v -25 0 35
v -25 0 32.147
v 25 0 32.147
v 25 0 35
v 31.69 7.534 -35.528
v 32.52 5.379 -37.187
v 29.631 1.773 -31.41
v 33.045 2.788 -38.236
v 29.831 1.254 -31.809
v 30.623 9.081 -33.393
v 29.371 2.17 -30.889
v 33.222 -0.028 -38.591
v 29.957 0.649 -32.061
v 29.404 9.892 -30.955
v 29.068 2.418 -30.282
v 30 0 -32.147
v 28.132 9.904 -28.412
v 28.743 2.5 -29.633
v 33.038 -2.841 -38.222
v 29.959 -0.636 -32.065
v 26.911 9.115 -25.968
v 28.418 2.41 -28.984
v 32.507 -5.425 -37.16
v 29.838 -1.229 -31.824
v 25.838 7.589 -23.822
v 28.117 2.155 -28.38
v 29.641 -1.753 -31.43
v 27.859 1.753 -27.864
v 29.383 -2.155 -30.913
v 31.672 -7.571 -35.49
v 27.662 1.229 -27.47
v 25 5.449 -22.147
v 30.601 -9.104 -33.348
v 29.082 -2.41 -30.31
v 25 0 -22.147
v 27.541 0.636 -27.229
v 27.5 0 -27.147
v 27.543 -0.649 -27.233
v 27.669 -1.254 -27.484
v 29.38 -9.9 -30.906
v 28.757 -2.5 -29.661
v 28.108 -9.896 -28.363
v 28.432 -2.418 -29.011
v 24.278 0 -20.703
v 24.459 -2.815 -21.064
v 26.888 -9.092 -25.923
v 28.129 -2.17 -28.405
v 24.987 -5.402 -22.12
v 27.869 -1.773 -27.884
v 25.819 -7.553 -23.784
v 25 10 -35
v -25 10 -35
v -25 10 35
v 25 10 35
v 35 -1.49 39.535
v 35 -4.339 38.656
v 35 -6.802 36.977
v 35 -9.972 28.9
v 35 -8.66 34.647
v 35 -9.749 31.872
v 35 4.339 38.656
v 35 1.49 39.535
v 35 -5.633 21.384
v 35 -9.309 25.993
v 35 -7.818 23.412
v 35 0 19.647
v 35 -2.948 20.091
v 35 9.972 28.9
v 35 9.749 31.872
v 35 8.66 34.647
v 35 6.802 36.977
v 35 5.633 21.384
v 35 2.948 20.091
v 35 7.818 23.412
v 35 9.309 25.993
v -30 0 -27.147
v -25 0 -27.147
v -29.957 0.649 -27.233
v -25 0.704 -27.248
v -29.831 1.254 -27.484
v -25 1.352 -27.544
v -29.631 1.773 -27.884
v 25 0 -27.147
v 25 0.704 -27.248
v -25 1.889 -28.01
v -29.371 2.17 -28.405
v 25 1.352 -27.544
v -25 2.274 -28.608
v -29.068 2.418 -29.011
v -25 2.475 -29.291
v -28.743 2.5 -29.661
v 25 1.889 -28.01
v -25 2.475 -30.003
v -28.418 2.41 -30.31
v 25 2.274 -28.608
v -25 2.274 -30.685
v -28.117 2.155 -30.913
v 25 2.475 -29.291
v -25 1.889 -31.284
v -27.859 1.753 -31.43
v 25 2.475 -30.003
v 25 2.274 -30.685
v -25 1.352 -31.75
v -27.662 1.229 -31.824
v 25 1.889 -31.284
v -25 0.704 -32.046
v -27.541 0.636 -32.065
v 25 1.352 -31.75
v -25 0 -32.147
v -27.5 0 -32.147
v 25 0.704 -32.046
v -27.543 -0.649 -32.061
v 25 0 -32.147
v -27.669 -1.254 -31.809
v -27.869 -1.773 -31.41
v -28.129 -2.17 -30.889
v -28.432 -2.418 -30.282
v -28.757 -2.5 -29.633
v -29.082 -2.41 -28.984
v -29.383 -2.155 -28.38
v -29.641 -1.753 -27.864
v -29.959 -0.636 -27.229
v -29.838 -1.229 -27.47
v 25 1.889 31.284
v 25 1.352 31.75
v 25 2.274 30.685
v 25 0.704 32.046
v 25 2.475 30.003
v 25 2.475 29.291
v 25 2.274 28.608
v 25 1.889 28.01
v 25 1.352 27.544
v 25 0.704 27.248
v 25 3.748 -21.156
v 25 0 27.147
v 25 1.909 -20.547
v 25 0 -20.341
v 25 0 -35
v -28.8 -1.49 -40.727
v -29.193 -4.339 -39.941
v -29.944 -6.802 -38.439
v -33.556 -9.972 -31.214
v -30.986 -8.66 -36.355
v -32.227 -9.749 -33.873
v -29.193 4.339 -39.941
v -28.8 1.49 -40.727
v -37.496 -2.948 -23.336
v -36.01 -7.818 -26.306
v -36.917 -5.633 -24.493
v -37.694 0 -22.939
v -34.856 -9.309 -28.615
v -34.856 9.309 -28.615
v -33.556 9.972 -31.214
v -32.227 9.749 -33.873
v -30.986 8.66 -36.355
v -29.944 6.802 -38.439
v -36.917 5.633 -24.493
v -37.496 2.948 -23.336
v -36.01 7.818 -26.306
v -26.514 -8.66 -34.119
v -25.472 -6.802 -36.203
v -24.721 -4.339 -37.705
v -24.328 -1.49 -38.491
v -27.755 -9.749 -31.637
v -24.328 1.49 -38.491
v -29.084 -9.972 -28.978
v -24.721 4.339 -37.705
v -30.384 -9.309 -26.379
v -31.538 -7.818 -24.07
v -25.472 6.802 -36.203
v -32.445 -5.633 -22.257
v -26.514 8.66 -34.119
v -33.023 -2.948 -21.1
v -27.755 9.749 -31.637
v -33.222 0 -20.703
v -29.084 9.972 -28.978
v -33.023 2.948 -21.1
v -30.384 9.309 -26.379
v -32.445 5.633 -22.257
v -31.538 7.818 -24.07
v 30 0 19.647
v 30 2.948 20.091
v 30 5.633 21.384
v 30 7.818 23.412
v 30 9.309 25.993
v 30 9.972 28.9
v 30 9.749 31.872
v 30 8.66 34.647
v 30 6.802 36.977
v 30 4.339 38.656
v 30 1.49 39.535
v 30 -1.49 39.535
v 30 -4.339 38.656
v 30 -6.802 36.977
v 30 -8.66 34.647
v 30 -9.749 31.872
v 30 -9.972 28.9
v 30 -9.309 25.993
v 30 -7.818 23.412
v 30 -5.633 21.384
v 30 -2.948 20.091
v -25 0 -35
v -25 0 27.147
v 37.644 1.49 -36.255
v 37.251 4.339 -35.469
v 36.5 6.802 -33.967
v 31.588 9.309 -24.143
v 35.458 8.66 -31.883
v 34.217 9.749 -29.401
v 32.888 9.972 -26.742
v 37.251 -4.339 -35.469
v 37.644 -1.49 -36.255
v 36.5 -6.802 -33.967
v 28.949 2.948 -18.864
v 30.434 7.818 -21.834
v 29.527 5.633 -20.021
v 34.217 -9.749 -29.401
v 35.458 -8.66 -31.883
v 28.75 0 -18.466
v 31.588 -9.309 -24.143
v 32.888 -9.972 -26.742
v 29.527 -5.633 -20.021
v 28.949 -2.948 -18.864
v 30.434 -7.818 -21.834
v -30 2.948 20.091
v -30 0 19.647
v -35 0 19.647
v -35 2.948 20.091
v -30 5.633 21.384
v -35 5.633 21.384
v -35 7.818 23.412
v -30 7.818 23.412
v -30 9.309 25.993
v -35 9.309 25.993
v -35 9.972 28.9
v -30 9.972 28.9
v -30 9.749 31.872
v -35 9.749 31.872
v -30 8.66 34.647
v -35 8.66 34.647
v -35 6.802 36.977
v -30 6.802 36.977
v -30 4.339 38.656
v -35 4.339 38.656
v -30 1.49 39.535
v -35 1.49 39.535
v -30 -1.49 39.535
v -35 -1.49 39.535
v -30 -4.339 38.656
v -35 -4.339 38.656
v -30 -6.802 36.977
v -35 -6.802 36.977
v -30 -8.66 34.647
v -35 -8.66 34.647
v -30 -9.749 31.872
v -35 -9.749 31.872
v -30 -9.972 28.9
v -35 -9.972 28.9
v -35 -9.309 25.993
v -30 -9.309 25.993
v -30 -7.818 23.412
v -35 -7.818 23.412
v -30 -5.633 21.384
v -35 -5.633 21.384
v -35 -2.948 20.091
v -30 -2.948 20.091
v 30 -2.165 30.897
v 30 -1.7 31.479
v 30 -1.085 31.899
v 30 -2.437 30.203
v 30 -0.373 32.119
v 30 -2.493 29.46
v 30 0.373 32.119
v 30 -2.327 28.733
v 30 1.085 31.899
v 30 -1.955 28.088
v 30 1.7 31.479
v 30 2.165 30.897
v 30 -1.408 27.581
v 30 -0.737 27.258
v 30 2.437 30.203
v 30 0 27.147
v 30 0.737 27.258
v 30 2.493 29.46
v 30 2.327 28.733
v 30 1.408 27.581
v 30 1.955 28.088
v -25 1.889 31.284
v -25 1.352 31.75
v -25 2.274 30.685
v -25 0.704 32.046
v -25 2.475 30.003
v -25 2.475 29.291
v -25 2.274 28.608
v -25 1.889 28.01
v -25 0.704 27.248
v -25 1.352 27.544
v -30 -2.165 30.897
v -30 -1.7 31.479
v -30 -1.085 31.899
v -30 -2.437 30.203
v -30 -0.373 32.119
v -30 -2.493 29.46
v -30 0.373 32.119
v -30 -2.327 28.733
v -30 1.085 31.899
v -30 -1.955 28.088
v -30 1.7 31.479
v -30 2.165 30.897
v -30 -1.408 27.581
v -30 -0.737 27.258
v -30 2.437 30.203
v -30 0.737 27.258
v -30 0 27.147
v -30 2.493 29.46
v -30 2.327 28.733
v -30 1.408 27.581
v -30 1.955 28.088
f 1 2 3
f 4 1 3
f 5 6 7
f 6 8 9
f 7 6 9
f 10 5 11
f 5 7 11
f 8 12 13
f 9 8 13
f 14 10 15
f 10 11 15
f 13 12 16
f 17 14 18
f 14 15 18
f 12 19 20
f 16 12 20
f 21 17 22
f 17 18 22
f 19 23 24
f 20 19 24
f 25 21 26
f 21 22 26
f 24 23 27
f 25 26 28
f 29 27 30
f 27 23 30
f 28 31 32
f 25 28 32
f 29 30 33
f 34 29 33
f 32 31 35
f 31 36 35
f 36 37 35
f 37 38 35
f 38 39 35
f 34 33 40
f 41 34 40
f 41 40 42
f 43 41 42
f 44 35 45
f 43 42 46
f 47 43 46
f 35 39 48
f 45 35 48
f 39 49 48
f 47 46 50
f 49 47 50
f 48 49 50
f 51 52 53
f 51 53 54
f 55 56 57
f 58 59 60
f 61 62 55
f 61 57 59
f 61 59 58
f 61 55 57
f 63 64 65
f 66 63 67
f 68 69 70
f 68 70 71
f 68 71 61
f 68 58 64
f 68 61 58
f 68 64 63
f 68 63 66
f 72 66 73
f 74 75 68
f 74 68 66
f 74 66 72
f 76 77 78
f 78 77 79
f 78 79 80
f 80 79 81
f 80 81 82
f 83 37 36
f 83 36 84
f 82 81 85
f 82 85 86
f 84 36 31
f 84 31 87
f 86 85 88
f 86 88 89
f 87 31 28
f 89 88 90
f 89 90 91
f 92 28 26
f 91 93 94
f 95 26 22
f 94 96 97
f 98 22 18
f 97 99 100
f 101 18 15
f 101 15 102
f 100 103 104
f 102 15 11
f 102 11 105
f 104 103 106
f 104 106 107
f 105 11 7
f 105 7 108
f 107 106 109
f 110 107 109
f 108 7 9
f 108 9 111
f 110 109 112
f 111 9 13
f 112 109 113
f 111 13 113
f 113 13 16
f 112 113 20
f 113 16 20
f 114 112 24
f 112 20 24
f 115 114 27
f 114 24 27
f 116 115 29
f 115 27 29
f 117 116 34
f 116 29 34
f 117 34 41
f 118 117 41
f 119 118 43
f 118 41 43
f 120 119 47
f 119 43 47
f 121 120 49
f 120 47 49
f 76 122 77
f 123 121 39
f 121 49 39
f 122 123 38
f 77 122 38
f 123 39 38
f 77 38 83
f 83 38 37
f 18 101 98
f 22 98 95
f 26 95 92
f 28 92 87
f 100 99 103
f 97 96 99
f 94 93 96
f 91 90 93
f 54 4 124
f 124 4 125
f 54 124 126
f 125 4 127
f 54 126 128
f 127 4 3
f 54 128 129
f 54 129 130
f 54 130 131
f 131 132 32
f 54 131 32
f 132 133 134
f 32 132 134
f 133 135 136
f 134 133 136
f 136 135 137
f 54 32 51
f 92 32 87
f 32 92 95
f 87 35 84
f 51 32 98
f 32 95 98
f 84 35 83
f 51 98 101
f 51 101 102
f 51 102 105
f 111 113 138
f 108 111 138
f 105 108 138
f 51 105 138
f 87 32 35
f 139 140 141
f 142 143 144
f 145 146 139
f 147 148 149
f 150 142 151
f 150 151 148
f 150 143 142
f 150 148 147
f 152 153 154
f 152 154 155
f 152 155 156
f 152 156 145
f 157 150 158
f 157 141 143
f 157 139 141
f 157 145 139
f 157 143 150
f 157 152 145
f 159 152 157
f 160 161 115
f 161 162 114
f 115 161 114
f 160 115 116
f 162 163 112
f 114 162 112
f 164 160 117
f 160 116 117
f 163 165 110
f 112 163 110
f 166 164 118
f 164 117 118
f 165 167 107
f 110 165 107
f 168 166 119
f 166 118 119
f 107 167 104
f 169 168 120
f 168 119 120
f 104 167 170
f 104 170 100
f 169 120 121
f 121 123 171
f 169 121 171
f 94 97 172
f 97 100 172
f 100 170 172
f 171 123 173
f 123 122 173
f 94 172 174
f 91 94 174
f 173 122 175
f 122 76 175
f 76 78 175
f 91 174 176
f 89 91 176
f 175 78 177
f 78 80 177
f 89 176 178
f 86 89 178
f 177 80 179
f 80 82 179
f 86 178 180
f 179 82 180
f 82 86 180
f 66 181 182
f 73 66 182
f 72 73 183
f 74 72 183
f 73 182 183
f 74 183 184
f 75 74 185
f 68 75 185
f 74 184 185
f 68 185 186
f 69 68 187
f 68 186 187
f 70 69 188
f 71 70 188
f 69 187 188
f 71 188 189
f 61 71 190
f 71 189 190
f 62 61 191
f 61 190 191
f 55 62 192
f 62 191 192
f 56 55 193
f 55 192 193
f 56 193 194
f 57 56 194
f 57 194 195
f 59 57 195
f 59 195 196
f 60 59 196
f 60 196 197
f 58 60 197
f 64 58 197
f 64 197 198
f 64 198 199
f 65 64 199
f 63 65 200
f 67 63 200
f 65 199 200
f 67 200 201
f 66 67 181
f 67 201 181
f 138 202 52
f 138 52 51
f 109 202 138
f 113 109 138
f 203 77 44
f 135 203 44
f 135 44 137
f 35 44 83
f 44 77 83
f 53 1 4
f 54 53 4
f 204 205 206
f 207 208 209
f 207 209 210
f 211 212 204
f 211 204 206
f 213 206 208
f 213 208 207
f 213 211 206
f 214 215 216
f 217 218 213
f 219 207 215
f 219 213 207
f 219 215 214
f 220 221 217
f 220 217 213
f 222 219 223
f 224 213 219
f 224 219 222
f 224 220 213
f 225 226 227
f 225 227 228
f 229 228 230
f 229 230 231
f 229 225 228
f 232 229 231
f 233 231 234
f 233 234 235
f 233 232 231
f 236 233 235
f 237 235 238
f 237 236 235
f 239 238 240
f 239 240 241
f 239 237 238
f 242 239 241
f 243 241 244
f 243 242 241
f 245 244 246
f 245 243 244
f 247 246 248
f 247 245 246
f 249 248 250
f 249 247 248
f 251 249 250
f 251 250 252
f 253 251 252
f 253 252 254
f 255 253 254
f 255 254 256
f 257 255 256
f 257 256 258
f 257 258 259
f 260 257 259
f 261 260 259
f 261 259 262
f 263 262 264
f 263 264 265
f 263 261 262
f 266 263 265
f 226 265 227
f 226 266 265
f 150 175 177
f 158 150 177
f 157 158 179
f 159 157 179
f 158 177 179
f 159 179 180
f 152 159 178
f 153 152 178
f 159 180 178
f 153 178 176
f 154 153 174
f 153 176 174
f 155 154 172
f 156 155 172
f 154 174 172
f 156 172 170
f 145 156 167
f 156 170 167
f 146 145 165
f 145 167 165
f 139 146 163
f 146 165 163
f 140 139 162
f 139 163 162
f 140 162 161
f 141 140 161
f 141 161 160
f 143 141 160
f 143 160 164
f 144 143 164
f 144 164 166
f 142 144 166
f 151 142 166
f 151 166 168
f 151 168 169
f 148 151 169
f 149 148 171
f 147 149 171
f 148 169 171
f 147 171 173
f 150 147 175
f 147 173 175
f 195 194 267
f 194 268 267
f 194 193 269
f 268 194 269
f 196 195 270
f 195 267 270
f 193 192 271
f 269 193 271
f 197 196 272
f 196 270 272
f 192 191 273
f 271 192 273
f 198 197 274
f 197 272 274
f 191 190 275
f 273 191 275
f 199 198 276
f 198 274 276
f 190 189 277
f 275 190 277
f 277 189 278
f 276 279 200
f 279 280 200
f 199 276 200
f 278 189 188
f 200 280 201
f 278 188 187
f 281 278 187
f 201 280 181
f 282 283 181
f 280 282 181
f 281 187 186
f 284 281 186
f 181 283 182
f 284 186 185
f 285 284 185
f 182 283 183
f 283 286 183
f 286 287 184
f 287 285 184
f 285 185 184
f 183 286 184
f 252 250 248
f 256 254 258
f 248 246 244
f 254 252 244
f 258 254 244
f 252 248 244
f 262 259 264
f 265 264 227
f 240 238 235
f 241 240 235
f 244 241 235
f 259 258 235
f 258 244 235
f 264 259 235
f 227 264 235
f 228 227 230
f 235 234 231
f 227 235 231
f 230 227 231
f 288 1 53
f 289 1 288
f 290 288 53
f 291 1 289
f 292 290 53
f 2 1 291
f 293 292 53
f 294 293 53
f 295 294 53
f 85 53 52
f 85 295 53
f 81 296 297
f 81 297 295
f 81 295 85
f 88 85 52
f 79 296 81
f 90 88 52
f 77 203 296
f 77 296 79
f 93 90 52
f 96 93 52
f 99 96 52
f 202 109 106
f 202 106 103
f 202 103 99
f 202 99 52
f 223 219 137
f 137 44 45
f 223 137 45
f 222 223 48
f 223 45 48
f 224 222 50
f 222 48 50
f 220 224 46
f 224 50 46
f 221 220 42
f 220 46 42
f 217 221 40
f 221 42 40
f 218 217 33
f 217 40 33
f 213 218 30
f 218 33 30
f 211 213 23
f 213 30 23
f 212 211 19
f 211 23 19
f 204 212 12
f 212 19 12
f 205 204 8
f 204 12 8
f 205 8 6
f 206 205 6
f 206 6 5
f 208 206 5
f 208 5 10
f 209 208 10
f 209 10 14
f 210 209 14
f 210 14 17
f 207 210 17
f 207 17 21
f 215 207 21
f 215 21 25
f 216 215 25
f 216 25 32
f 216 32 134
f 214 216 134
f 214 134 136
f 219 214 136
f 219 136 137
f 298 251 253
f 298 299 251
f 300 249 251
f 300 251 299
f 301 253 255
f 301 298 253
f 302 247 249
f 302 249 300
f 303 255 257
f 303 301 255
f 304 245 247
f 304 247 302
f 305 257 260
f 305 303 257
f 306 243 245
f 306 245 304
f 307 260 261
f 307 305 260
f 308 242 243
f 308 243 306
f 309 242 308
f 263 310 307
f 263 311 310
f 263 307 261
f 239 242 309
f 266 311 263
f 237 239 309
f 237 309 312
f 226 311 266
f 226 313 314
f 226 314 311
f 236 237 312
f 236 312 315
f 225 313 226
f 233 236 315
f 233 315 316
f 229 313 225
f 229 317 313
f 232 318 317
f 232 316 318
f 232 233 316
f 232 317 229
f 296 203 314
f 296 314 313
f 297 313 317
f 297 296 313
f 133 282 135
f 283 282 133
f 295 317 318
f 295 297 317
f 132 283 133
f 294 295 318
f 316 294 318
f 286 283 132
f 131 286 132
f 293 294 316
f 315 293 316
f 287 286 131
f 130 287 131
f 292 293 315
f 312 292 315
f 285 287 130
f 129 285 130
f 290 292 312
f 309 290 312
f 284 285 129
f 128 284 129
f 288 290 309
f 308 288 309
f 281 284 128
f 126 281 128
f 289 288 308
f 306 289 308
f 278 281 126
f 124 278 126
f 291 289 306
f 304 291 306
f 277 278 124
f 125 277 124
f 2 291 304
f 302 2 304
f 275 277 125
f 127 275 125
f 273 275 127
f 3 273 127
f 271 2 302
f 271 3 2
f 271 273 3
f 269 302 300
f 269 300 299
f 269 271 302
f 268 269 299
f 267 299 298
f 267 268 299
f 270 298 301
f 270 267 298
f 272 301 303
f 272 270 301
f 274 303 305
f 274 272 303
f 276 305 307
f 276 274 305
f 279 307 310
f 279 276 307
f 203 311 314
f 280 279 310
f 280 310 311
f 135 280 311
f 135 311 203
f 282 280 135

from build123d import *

# Parameters (mm, degrees)
CROQUIS2_W                 = 50
CROQUIS2_H                 = 70
SALIENTE_EXTRUIR1_DEPTH    = 10
CROQUIS4_R                 = 2.5
SALIENTE_EXTRUIR2_DEPTH    = 30
CROQUIS5_R                 = 10
SALIENTE_EXTRUIR3_DEPTH    = 5
CORTAR_EXTRUIR1_DEPTH      = 5
CORTAR_EXTRUIR1_DEPTH_BACK = 5
CROQUIS8_R                 = 10
SALIENTE_EXTRUIR4_DEPTH    = 5
CROQUIS9_R                 = 10
SALIENTE_EXTRUIR5_DEPTH    = 5


with BuildPart() as part:
    # Croquis2 → Saliente-Extruir1 (new body)
    with BuildSketch(Plane(origin=(0, 0, 0), x_dir=(1, 0, 0), z_dir=(0, 1, 0))):
        Rectangle(CROQUIS2_W, CROQUIS2_H)
    extrude(amount=SALIENTE_EXTRUIR1_DEPTH)

    # Croquis4 → Saliente-Extruir2 (add, symmetric)
    with BuildSketch(Plane(origin=(0, 0, 0), x_dir=(0, 0, -1), z_dir=(1, 0, 0))):
        with Locations((-29.646809276, 0)):
            Circle(CROQUIS4_R)
    saliente_extruir2 = extrude(amount=SALIENTE_EXTRUIR2_DEPTH, both=True)

    # Croquis5 → Saliente-Extruir3 (add)
    with BuildSketch(Plane(origin=(30, 0, 0), x_dir=(0, 0, -1), z_dir=(1, 0, 0))):
        with Locations((-29.646809276, 0)):
            Circle(CROQUIS5_R)
    saliente_extruir3 = extrude(amount=SALIENTE_EXTRUIR3_DEPTH)

    # Simetría1: Saliente-Extruir3 across plane
    add(saliente_extruir3.mirror(Plane(origin=(0, 0, 0), x_dir=(0, 0, 1), z_dir=(1, 0, 0))))

    # Simetría2: Saliente-Extruir2 across plane
    add(saliente_extruir2.mirror(Plane.XY))

    # Croquis7 → Cortar-Extruir1 (cut, two sides: drawn at the far end of the back side and taken through both)
    with BuildSketch(Plane(origin=(0, 0, 0), x_dir=(1, 0, 0), z_dir=(0, 1, 0)).offset(-CORTAR_EXTRUIR1_DEPTH_BACK)):
        Polygon((-30, 27.146809276), (-27.5, 32.146809276), (-30, 32.146809276), align=None)
        Polygon((30, 32.146809276), (27.5, 27.146809276), (30, 27.146809276), align=None)
    extrude(amount=CORTAR_EXTRUIR1_DEPTH + CORTAR_EXTRUIR1_DEPTH_BACK, mode=Mode.SUBTRACT)

    # Croquis8 → Saliente-Extruir4 (add)
    with BuildSketch(Plane(origin=(11.14127629, 0, 5.570638145), x_dir=(0.4472135954999586, 0, -0.8944271909999156), z_dir=(0.8944271909999156, 0, 0.4472135954999586))):
        with Locations(Location((39.374303213, 0, 0), (0, 0, 180))):
            Circle(CROQUIS8_R)
    extrude(amount=SALIENTE_EXTRUIR4_DEPTH)

    # Croquis9 → Saliente-Extruir5 (add)
    with BuildSketch(Plane(origin=(-34.85872371, 0, -17.429361855), x_dir=(-0.44721359549995665, 0, 0.8944271909999165), z_dir=(-0.8944271909999165, 0, -0.44721359549995665))):
        with Locations((-13.659521472, 0)):
            Circle(CROQUIS9_R)
    extrude(amount=SALIENTE_EXTRUIR5_DEPTH)


solid = part.part
